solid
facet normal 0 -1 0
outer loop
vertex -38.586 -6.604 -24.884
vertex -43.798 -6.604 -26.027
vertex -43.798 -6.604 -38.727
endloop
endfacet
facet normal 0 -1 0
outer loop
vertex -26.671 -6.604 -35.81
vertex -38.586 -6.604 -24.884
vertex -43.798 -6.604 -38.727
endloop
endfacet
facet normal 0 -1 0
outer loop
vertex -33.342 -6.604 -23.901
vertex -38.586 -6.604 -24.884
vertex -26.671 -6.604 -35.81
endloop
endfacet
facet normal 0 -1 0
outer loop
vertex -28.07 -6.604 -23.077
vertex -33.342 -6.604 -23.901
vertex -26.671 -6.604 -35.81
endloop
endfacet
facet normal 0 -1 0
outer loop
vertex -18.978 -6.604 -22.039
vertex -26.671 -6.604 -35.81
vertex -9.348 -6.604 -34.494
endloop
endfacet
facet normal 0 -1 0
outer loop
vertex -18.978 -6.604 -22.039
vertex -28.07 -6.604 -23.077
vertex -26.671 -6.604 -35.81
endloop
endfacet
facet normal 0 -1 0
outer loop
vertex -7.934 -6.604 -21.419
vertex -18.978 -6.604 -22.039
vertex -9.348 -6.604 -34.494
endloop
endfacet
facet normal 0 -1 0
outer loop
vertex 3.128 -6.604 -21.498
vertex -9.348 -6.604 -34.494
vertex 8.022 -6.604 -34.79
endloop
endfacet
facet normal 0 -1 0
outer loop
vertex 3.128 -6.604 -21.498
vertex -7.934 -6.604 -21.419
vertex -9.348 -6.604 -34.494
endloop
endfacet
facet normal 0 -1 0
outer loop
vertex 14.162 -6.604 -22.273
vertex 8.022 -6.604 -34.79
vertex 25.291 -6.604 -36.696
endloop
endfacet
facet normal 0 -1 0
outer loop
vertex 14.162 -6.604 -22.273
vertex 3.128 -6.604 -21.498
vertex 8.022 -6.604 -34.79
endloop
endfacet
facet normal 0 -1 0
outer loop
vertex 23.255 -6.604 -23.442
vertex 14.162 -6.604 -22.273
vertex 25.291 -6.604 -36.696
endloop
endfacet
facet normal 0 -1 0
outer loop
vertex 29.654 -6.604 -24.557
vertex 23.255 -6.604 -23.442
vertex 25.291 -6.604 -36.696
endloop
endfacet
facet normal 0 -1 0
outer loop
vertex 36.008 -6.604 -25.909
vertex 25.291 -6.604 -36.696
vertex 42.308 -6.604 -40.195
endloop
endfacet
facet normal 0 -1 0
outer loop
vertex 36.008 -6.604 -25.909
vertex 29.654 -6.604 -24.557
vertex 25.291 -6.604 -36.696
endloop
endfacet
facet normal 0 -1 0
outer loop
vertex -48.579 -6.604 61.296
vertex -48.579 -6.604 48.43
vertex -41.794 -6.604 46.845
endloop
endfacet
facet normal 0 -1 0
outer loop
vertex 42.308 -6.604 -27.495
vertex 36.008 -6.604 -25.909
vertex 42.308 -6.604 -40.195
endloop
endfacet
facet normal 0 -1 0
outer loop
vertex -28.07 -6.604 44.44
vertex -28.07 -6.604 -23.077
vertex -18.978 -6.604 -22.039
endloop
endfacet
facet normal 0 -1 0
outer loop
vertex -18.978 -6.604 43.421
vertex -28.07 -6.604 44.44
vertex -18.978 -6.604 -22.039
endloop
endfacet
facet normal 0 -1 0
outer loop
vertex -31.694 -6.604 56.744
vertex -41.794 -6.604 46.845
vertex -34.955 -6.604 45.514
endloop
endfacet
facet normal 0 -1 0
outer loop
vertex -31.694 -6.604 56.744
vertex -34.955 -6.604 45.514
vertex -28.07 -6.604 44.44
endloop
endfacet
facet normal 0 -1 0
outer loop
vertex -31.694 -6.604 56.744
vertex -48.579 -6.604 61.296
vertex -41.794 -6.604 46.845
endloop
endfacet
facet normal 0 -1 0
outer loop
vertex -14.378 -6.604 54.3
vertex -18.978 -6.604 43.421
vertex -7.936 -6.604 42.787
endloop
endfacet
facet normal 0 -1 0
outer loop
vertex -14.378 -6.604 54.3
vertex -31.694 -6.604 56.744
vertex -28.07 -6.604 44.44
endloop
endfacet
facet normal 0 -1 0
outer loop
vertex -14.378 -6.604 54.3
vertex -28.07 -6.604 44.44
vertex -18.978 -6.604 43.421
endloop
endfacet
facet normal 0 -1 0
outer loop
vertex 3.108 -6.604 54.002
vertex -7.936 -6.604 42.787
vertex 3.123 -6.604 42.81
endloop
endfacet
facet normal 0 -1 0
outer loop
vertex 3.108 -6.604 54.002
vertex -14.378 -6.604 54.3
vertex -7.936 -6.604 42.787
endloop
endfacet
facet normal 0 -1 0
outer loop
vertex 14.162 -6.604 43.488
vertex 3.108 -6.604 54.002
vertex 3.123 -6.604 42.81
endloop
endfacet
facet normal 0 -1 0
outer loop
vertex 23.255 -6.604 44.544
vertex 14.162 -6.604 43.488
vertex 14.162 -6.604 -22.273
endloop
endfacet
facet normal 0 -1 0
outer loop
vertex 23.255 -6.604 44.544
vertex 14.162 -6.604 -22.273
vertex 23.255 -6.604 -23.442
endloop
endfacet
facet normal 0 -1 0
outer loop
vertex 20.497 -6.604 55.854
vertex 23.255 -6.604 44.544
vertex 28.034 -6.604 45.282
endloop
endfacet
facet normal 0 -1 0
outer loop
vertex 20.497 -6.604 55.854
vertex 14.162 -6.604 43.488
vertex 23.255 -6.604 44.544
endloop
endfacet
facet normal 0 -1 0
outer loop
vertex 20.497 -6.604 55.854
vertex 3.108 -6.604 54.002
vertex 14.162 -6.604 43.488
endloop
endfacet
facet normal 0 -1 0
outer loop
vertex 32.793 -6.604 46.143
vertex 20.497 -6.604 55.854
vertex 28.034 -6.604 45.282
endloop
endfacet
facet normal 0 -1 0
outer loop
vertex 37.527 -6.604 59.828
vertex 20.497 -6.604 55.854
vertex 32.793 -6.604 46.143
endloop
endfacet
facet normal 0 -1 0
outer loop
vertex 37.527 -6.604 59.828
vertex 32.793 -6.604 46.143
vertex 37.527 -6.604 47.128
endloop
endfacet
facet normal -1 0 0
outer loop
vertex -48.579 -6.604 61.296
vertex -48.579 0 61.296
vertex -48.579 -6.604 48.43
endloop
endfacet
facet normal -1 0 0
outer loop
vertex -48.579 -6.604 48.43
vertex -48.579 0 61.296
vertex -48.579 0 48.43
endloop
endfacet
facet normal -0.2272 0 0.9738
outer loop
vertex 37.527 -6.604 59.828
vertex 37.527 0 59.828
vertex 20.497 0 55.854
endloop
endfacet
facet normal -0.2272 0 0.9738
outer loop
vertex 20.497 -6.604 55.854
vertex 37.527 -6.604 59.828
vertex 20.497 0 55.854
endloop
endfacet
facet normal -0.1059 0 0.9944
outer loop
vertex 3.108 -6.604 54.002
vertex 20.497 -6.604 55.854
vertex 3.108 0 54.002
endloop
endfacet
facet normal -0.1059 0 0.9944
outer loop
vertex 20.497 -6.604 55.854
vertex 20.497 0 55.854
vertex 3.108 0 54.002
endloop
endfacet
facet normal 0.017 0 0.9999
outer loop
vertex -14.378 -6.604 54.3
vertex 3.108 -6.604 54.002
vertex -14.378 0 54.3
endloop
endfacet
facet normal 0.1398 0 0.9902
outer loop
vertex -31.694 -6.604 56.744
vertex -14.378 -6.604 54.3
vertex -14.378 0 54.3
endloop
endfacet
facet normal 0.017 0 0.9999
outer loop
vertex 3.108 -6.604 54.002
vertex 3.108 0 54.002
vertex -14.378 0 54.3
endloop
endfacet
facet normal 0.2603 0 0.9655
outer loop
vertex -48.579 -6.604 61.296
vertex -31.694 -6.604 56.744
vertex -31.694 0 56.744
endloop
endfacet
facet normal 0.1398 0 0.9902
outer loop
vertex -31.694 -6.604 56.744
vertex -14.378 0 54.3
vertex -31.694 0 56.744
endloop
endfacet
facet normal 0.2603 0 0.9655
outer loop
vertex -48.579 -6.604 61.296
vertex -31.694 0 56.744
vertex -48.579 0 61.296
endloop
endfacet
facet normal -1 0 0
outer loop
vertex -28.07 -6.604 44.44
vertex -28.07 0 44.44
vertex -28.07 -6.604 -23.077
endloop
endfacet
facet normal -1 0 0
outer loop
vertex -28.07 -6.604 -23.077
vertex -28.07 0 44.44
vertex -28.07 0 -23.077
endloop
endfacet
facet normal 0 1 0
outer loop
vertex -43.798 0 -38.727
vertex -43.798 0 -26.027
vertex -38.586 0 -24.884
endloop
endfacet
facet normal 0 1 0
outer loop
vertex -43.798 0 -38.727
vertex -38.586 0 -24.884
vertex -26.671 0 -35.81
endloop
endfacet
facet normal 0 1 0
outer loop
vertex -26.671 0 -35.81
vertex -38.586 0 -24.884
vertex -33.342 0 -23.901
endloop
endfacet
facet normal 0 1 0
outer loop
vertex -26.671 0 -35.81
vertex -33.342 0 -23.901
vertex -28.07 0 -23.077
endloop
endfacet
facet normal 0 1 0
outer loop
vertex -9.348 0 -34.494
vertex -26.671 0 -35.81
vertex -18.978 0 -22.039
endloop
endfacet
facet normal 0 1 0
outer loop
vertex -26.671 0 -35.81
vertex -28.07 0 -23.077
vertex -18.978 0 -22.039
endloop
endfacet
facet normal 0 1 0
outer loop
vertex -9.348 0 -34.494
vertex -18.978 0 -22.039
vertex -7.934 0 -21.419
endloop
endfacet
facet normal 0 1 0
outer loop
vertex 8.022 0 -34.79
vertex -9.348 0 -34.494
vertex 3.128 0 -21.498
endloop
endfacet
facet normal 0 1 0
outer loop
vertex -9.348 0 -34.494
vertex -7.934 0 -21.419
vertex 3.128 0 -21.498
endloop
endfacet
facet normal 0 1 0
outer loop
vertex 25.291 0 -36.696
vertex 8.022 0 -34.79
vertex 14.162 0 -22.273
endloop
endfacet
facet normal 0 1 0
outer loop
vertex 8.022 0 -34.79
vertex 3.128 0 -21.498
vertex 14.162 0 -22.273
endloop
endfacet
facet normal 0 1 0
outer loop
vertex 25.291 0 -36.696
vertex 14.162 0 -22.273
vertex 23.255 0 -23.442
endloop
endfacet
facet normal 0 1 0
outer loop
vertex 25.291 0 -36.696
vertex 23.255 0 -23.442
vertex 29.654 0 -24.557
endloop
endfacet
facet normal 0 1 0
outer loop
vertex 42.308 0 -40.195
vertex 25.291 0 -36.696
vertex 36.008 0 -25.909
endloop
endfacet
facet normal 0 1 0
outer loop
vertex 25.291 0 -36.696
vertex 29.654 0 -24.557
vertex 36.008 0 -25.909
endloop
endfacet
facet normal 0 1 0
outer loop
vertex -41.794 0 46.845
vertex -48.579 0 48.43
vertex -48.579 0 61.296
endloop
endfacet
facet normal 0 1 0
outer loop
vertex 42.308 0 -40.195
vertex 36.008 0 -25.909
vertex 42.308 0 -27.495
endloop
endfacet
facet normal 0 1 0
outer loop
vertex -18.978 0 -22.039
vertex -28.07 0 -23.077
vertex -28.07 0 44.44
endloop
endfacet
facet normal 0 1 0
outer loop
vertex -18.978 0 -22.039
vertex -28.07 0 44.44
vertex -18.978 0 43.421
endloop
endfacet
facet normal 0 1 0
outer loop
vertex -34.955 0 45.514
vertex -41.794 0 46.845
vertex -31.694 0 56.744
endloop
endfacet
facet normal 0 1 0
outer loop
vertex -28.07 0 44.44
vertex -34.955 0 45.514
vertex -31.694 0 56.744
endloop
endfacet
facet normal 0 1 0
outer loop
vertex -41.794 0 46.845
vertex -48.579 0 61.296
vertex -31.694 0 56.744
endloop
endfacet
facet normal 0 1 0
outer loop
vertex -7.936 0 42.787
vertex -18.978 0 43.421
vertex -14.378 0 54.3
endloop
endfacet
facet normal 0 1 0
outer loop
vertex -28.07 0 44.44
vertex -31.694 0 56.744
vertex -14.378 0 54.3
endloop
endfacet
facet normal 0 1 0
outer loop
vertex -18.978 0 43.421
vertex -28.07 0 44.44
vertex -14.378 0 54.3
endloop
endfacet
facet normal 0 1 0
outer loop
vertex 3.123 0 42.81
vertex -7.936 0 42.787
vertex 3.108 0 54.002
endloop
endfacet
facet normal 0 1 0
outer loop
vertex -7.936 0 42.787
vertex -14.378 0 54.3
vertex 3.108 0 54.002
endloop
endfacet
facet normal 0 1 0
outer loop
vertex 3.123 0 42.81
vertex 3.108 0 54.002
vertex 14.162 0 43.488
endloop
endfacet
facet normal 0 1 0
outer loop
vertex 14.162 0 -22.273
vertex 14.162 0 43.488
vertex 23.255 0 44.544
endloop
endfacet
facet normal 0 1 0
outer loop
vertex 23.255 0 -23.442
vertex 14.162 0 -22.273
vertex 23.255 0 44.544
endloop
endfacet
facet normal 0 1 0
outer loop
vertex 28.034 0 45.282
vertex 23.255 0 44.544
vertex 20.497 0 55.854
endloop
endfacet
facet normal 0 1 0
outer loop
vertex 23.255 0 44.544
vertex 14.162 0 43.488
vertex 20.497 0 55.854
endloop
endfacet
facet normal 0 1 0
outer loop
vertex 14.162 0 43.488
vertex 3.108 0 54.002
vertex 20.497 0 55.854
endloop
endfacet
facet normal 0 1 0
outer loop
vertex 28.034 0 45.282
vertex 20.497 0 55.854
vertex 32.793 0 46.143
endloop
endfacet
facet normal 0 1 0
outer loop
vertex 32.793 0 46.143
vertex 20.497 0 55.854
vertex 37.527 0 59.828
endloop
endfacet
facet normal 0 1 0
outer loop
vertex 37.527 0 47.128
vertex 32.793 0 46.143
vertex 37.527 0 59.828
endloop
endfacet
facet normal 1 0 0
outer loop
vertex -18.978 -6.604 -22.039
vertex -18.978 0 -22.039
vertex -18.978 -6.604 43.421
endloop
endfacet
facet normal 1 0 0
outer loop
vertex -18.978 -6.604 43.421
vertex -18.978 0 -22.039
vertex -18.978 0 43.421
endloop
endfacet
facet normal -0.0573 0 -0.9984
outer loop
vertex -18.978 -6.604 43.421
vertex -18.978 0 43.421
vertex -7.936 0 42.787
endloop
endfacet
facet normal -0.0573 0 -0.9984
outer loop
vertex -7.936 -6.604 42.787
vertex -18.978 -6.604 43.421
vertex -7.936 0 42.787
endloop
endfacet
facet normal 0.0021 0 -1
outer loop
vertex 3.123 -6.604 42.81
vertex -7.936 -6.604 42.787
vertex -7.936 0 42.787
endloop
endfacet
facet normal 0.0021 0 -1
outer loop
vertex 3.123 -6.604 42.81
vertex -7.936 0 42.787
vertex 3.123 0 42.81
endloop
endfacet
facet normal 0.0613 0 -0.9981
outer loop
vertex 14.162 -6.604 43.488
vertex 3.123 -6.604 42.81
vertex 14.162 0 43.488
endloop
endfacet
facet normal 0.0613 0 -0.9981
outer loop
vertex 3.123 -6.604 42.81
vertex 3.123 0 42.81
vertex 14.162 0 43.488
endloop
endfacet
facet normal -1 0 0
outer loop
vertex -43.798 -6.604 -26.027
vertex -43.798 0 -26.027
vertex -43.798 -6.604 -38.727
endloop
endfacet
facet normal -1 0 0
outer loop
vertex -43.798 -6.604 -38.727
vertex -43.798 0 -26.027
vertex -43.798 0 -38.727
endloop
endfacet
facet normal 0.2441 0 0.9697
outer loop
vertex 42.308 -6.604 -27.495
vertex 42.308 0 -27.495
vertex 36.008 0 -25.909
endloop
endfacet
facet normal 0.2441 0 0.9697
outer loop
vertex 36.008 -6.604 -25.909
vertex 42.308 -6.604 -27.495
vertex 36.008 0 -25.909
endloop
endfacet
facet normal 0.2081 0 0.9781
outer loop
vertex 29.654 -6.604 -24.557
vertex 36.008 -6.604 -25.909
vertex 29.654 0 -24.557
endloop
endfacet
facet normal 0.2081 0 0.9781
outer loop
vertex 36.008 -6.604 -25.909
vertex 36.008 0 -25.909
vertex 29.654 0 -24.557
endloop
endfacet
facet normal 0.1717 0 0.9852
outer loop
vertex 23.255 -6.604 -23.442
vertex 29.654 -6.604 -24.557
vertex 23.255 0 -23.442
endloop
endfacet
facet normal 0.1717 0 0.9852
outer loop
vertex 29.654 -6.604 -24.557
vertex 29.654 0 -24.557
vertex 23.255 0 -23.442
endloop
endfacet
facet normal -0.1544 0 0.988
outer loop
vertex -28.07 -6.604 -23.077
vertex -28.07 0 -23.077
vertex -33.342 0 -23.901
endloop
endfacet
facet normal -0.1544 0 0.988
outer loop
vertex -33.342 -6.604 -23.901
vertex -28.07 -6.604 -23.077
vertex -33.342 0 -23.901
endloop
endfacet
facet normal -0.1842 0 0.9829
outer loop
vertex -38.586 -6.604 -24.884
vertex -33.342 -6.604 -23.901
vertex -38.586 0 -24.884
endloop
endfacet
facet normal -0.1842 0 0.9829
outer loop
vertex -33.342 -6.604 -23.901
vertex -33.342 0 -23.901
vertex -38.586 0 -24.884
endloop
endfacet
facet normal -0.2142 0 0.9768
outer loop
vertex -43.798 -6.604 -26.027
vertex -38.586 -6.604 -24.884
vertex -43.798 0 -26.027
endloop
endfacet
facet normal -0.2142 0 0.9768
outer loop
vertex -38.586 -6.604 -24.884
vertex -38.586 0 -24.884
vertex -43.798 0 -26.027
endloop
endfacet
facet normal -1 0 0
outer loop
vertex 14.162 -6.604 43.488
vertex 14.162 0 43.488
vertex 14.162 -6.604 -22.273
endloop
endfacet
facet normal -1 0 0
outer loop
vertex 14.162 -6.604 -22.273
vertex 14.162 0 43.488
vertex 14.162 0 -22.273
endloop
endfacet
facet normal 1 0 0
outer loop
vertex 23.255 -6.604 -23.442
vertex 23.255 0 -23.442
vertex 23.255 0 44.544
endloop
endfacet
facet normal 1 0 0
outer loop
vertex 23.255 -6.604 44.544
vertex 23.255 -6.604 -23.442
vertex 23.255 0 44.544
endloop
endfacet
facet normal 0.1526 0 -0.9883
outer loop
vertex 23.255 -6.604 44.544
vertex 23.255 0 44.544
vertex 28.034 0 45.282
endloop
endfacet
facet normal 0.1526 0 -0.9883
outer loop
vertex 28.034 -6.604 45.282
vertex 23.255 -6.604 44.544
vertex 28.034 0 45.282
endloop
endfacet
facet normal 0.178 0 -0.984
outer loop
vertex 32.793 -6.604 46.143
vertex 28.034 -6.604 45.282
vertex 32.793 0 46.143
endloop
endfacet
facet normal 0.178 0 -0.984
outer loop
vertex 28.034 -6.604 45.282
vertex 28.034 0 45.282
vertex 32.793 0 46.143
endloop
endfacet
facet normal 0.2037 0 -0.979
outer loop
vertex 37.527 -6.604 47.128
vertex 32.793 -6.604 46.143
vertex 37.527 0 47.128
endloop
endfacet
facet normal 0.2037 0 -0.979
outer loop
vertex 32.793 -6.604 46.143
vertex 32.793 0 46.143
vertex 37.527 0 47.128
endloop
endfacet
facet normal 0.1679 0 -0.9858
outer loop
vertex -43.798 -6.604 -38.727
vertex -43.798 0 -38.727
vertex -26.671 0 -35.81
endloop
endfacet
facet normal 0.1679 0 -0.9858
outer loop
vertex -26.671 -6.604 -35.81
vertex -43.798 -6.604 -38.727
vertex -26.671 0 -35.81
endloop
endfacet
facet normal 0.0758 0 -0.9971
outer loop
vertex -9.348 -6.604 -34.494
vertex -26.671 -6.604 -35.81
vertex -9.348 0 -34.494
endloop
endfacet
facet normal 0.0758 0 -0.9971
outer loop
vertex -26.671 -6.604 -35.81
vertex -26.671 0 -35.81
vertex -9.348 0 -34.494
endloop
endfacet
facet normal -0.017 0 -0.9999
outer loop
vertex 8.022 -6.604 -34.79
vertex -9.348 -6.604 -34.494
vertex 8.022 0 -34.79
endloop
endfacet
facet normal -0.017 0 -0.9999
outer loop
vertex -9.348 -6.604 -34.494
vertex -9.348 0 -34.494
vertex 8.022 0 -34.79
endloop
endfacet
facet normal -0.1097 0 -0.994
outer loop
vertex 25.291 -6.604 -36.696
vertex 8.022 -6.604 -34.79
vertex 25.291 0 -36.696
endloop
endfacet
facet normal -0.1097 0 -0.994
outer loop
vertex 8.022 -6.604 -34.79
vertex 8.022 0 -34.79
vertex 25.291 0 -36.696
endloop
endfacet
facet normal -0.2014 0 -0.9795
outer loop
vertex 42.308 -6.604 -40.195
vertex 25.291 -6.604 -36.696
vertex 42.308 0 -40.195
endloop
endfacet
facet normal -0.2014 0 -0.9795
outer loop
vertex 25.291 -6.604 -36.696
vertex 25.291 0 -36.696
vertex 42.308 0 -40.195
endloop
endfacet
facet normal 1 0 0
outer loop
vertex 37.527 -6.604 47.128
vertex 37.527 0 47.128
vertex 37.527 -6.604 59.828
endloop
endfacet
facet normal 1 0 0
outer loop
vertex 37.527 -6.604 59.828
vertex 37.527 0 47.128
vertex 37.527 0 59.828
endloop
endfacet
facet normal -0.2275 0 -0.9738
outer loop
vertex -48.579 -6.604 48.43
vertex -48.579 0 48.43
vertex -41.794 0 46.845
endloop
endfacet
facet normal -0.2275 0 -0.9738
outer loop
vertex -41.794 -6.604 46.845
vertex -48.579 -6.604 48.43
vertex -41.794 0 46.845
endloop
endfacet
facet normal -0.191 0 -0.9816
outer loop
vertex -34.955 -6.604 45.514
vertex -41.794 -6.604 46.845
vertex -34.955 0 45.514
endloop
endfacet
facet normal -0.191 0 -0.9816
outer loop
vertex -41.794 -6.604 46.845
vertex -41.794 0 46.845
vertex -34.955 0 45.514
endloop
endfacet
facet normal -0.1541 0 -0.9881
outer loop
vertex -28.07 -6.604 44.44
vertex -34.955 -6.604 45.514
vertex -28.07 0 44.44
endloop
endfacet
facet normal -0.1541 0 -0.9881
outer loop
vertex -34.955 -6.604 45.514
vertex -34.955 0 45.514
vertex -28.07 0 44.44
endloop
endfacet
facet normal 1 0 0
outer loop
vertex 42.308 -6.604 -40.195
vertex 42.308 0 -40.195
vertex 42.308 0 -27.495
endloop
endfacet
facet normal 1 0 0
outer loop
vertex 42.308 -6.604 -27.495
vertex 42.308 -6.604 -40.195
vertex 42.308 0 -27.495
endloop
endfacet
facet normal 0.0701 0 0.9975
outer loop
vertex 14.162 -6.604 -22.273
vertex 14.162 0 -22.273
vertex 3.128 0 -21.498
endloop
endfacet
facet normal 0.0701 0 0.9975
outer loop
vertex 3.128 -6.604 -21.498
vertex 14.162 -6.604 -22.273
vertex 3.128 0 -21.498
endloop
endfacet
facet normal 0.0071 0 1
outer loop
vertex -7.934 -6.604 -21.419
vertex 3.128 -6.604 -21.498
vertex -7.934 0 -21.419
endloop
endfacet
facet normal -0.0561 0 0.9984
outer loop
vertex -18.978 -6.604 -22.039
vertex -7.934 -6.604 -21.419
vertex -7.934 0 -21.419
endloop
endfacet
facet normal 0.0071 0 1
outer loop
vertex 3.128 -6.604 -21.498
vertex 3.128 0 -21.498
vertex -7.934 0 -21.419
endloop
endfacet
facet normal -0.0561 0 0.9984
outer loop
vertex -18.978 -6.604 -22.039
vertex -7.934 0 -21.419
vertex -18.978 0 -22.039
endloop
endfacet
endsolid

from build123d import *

# Parameters (mm, degrees)
F1_DEPTH = 6.604


with BuildPart() as f1:
    # F0 (on Front) → F1 (new body)
    with BuildSketch(Plane.XZ):
        with BuildLine():
            ThreePointArc((-43.79801, -38.727241), (-0.659432, -34.440726), (42.30799, -40.195004))
            Line((42.30799, -40.195004), (42.30799, -27.495004))
            ThreePointArc((42.30799, -27.495004), (32.83759, -25.203711), (23.254529, -23.442051))
            Line((23.254529, -23.442051), (23.254529, 44.543938))
            ThreePointArc((23.254529, 44.543938), (30.416051, 45.697065), (37.527271, 47.128027))
            Line((37.527271, 47.128027), (37.527271, 59.828027))
            ThreePointArc((37.527271, 59.828027), (-5.639596, 53.881838), (-48.578729, 61.295779))
            Line((-48.578729, 61.295779), (-48.578729, 48.430497))
            ThreePointArc((-48.578729, 48.430497), (-38.380513, 46.14736), (-28.070346, 44.439504))
            Line((-28.070346, 44.439504), (-28.070339, -23.076924))
            ThreePointArc((-28.070339, -23.076924), (-35.967851, -24.372561), (-43.79801, -26.027241))
            Line((-43.79801, -26.027241), (-43.79801, -38.727241))
        make_face()
        with BuildLine():
            Line((-18.977908, -22.038799), (-18.977908, 43.420898))
            ThreePointArc((-18.977908, 43.420898), (-2.406415, 42.716282), (14.162091, 43.487954))
            Line((14.162091, 43.487954), (14.162091, -22.273066))
            ThreePointArc((14.162091, -22.273066), (-2.402361, -21.371167), (-18.977908, -22.038799))
        make_face(mode=Mode.SUBTRACT)
    extrude(amount=F1_DEPTH)


solid = f1.part
